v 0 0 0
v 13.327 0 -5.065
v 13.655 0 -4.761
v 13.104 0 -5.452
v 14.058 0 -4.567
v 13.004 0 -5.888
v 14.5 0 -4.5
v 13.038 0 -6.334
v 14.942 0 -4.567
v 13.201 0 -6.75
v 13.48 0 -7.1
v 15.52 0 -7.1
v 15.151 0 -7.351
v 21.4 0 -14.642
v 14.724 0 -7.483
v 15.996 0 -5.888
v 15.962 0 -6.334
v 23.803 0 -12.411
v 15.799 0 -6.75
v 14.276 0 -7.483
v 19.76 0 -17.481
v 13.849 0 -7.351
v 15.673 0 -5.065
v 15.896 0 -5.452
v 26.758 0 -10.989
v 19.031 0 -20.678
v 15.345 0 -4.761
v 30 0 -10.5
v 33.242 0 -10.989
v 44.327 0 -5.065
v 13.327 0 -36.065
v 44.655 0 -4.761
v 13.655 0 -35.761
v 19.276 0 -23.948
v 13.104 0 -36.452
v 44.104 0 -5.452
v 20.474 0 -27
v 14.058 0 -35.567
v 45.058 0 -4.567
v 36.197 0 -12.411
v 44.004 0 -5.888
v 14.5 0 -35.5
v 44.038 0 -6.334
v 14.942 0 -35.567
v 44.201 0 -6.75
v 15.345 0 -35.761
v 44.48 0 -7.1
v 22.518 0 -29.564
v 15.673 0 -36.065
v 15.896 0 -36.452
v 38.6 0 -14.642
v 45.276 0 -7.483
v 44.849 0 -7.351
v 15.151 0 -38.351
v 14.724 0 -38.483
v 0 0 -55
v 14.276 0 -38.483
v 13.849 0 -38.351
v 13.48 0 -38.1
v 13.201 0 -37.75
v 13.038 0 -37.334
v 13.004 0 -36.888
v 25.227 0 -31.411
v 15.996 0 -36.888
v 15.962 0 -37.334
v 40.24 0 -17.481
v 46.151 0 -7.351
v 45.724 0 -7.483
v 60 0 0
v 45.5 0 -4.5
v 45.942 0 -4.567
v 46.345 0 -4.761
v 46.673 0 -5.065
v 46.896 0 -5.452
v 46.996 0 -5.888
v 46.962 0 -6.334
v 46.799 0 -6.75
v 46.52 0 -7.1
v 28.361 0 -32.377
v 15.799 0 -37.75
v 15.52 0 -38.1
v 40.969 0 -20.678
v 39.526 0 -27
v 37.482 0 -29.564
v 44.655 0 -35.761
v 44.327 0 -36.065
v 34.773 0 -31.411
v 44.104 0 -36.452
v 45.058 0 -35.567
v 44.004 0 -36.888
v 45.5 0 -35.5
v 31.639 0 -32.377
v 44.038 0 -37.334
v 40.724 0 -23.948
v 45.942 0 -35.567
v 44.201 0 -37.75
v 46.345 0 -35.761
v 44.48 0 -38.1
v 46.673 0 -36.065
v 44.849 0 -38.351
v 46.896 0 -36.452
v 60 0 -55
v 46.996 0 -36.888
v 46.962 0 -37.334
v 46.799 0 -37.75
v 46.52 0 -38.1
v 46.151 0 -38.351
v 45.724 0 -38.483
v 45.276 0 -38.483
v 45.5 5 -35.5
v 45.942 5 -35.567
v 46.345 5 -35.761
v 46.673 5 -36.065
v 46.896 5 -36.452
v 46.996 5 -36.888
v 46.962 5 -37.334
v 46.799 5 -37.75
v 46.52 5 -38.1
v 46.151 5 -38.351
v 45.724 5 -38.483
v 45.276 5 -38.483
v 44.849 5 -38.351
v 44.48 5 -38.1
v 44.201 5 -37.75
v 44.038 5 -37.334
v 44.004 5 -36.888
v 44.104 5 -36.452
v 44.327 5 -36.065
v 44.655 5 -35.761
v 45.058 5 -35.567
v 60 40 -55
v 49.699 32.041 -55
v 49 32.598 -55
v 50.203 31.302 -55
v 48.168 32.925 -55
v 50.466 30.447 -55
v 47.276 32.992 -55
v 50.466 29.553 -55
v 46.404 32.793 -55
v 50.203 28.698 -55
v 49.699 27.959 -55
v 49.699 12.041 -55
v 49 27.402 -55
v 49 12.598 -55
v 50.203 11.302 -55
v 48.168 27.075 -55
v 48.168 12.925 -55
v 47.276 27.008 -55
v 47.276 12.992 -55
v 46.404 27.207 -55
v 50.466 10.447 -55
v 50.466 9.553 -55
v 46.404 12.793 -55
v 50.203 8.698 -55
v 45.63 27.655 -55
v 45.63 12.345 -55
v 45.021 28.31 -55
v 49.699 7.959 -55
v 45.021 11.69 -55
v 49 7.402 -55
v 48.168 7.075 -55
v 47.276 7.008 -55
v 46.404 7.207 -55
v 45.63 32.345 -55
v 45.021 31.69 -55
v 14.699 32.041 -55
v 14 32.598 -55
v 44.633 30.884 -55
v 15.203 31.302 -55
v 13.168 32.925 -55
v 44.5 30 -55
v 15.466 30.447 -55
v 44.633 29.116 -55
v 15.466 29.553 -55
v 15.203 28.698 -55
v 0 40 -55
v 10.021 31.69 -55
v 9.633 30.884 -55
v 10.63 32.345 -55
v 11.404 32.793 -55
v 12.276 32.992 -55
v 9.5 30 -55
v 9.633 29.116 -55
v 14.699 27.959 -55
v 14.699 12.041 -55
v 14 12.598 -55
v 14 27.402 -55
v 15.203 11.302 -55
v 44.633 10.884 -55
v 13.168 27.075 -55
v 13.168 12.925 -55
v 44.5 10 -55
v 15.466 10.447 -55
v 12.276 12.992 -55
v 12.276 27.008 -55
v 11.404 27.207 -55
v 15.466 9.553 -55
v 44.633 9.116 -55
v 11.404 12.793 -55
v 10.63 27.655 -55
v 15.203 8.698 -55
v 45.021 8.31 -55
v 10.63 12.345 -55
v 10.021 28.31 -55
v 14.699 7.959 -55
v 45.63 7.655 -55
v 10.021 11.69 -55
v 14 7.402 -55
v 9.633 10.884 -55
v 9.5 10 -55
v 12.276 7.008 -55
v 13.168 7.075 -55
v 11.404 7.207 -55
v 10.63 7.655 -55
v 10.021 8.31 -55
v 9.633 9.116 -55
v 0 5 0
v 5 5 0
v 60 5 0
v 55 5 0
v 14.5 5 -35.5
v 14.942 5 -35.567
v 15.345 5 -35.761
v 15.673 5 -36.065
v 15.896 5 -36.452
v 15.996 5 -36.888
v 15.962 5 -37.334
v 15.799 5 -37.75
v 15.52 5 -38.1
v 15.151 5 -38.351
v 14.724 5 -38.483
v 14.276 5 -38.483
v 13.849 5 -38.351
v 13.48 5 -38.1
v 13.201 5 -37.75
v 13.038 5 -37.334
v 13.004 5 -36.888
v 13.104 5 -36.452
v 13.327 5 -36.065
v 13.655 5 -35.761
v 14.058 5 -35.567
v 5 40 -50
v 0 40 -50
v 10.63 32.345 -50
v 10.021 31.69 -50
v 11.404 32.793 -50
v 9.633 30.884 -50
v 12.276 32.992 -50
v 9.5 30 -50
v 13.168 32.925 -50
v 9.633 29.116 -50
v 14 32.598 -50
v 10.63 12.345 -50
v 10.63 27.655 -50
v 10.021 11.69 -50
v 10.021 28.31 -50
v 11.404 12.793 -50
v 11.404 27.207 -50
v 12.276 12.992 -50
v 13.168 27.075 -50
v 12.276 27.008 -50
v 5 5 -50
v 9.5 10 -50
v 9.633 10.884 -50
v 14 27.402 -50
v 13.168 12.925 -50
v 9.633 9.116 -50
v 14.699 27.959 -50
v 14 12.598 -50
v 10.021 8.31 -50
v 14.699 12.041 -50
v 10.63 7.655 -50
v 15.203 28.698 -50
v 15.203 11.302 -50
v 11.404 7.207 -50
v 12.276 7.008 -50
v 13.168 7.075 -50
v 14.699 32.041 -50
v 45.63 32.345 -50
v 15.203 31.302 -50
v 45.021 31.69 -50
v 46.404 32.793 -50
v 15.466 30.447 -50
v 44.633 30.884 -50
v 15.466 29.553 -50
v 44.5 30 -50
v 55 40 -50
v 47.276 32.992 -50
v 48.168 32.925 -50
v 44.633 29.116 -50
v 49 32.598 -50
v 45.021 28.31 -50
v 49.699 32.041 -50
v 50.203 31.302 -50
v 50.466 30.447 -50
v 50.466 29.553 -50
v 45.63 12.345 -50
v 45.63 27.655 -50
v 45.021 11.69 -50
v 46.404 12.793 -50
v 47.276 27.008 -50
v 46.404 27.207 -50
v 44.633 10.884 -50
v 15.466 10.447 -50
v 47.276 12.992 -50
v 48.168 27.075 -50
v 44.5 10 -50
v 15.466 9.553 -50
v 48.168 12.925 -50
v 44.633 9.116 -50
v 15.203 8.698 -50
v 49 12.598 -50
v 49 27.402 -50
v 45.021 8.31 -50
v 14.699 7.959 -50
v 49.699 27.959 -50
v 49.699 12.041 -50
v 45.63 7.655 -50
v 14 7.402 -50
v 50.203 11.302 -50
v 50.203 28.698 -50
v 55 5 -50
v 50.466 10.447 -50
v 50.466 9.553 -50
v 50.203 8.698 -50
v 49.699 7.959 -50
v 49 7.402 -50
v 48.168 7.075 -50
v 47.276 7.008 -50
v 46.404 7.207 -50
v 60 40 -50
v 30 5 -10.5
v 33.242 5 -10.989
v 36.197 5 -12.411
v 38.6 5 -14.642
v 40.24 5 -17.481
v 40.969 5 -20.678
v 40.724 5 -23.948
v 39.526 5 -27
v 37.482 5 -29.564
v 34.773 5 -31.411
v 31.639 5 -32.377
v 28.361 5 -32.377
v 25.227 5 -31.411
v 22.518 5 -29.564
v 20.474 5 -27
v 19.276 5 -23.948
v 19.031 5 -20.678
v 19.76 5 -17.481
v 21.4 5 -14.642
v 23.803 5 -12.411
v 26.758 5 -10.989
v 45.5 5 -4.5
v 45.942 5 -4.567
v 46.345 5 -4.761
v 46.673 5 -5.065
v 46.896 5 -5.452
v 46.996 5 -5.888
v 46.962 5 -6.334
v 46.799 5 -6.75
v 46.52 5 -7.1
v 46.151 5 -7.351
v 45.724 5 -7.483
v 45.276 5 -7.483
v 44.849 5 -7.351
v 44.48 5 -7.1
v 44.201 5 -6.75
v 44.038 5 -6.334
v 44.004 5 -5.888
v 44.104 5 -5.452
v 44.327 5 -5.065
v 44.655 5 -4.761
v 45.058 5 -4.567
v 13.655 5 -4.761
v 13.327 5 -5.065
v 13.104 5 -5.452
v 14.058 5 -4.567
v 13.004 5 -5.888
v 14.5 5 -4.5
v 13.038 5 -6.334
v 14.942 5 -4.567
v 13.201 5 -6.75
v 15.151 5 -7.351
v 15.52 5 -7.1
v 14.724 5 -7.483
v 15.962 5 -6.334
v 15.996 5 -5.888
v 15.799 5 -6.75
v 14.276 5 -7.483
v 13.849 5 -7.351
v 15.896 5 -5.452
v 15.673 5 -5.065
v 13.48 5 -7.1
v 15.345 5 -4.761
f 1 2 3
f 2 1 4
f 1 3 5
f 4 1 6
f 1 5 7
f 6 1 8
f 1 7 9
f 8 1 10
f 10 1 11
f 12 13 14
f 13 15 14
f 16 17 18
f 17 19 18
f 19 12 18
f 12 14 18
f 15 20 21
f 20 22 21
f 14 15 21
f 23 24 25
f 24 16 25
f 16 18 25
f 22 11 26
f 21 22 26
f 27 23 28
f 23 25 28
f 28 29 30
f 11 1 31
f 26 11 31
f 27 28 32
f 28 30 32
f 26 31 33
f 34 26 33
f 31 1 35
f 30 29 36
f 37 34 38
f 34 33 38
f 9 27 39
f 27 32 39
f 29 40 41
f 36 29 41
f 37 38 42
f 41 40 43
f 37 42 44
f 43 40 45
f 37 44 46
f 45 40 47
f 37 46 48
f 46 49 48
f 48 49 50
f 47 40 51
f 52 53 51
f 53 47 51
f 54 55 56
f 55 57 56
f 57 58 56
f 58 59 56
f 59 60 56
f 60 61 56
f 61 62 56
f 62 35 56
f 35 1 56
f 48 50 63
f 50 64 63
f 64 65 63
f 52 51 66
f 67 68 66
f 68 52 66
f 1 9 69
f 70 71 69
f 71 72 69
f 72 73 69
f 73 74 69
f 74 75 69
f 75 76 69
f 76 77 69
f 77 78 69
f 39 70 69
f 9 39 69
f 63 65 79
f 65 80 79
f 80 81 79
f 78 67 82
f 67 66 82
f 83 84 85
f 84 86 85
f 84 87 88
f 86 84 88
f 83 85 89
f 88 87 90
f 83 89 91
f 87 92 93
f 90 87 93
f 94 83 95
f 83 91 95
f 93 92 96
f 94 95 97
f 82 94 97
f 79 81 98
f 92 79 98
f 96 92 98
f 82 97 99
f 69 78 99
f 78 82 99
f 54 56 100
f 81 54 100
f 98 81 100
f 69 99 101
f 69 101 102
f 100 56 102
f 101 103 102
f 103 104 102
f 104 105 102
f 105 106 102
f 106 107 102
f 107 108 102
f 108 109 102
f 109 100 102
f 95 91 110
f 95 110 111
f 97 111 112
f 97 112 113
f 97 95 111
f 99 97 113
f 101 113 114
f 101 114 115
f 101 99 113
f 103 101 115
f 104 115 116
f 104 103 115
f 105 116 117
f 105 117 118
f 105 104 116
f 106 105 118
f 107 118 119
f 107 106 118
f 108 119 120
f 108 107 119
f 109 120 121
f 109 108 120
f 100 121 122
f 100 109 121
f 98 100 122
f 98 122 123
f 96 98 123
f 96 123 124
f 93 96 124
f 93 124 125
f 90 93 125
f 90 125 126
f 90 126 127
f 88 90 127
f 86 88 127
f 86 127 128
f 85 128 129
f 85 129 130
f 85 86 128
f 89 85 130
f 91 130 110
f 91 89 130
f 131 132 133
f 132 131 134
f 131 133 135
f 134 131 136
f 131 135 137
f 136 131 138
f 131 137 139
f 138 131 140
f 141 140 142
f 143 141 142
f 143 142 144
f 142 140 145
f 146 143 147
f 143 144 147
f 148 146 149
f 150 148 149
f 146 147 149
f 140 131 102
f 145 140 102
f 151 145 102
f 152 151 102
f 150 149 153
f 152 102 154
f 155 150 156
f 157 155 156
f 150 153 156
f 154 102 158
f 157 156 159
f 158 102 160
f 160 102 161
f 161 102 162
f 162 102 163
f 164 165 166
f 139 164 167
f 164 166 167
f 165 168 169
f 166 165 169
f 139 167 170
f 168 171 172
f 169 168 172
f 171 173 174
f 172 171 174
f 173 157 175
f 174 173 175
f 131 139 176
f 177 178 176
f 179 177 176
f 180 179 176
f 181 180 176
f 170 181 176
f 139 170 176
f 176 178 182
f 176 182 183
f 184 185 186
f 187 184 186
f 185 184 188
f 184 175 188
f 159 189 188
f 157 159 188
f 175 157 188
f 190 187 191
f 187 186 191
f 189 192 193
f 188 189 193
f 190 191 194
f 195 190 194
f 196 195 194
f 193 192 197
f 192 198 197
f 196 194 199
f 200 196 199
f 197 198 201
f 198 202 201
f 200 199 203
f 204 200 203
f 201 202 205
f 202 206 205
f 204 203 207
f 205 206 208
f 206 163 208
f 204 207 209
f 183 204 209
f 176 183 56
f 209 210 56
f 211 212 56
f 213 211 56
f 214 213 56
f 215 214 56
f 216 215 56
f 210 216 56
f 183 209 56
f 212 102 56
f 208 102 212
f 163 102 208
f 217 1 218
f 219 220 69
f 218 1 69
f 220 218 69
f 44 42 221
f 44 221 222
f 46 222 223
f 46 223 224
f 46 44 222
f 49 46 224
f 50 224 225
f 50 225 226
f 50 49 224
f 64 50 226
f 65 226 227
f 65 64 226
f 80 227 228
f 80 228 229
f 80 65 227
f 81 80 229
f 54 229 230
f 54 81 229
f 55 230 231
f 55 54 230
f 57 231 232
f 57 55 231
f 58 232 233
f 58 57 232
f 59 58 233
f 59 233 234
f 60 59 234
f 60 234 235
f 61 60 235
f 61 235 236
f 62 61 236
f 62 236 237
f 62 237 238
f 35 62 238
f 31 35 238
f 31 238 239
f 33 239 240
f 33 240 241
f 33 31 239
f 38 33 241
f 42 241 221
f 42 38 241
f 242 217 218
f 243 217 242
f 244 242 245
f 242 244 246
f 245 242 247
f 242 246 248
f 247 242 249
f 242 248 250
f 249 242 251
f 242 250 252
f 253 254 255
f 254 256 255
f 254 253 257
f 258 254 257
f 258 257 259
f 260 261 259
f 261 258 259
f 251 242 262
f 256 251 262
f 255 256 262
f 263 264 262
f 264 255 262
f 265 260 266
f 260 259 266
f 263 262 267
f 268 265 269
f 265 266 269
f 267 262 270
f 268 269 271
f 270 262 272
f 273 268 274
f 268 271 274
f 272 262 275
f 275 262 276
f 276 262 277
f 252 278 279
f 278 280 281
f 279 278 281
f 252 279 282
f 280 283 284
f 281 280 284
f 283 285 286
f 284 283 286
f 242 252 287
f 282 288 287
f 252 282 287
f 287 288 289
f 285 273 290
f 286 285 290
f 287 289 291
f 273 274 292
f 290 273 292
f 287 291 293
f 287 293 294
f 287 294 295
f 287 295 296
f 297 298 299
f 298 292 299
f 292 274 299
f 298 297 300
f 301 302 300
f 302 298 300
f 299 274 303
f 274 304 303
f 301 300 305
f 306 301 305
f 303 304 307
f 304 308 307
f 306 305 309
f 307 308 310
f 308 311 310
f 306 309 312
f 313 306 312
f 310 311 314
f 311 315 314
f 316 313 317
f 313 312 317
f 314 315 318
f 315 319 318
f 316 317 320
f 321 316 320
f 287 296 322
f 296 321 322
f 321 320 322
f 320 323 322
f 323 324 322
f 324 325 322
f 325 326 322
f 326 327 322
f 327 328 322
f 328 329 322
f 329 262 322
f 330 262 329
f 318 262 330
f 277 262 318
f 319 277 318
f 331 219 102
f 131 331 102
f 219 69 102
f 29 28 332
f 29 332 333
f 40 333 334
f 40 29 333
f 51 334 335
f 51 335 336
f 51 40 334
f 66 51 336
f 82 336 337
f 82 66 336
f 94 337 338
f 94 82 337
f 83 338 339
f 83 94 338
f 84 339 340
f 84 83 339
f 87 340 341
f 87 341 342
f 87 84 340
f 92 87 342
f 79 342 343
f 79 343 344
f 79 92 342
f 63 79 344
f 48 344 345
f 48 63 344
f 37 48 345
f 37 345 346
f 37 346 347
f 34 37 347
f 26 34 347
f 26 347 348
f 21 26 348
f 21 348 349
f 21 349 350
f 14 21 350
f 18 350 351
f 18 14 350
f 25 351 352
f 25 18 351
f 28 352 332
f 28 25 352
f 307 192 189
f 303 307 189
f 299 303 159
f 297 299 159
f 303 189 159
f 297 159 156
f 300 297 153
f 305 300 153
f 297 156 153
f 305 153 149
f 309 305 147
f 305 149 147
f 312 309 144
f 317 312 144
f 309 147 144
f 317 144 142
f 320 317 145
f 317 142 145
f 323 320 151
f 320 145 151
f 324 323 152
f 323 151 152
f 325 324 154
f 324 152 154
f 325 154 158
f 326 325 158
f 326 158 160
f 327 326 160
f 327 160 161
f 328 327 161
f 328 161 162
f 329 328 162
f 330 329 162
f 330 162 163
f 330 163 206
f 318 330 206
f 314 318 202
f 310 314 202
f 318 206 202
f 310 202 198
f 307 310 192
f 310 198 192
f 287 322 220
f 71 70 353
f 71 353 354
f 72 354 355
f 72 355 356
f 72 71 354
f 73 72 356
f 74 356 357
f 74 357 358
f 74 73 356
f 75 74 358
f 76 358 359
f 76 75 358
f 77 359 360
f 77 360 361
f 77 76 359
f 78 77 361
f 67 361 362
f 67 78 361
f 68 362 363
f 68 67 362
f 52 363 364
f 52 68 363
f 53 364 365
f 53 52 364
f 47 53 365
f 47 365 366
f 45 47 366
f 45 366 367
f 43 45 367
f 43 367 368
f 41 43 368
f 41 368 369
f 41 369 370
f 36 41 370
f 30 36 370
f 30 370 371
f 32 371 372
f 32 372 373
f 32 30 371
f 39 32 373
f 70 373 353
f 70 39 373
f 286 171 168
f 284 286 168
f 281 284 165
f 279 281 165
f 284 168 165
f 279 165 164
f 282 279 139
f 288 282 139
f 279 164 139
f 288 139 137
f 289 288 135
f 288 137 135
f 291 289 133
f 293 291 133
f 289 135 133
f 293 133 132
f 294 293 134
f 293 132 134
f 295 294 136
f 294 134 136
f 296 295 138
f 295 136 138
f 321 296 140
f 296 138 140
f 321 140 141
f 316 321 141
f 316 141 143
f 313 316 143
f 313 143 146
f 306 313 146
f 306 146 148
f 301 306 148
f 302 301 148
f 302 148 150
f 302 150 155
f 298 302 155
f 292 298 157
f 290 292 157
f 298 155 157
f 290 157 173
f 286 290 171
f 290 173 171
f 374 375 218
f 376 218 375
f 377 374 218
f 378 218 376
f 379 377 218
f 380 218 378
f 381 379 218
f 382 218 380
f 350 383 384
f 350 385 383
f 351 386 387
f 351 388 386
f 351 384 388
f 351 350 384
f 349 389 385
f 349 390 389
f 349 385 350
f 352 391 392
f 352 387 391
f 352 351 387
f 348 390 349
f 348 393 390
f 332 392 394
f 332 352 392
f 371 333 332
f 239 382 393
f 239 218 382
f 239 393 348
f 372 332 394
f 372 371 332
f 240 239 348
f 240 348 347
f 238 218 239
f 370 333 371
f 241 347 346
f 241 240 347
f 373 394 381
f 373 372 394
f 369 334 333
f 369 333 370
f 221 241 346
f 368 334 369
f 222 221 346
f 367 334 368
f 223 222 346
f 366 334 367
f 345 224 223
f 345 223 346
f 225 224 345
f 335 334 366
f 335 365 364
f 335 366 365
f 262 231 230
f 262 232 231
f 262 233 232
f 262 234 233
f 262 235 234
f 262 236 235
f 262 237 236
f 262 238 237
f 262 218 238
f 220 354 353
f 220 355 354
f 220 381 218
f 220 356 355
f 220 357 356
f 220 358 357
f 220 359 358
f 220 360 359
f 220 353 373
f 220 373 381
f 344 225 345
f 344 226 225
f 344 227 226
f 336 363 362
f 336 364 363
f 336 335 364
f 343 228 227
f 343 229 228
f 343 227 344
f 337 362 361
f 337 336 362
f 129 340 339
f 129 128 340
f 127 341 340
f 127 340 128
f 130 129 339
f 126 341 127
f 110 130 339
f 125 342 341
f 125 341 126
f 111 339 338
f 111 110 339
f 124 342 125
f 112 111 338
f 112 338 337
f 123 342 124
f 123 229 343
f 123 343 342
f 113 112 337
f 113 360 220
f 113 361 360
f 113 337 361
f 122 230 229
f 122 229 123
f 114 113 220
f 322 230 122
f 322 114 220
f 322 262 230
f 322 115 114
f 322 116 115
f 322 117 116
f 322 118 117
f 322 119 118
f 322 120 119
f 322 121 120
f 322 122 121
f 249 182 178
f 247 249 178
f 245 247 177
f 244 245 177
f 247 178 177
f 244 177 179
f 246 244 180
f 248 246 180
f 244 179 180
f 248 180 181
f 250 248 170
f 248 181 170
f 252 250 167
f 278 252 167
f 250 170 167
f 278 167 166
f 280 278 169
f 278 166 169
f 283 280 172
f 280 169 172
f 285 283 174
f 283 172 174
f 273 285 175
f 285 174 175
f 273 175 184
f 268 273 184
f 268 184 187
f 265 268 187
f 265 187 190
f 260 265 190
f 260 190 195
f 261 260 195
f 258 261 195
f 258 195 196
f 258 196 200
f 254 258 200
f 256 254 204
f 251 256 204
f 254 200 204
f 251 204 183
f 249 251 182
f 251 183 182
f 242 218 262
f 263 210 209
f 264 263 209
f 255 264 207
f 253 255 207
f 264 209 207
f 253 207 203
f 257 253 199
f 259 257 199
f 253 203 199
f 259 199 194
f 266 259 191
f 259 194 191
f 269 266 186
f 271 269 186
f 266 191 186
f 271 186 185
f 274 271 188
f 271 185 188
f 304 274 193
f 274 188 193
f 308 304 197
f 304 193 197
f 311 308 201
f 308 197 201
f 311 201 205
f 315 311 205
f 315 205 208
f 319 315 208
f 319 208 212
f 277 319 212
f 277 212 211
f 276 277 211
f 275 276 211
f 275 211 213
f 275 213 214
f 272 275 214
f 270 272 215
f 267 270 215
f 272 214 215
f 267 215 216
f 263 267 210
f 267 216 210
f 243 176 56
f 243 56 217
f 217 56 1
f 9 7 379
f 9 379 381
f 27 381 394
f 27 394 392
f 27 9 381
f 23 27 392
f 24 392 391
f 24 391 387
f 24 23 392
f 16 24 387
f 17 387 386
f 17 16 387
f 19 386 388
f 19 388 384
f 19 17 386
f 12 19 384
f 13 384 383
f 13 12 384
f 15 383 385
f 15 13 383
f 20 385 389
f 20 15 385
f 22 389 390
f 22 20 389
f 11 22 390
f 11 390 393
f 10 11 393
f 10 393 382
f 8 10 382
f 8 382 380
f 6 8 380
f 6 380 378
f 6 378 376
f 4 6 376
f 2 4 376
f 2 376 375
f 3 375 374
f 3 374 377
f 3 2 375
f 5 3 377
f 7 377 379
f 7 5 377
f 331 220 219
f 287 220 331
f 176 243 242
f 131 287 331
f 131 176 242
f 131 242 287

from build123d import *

# Parameters (mm, degrees)
SKETCH_1_W          = 60
SKETCH_1_H          = 55
SKETCH_1_R          = 11
SKETCH_1_R_2        = 1.5
EXTRUDE_1_DEPTH     = 5
EXTRUDE_2_DEPTH     = 35
SKETCH_4_R          = 3
CUT_EXTRUDE_1_DEPTH = 5
CUT_EXTRUDE_2_REACH = 92.692


with BuildPart() as part:
    # Эскиз1 → Бобышка-Вытянуть1 (new body)
    with BuildSketch(Plane(origin=(0, 0, 0), x_dir=(1, 0, 0), z_dir=(0, 1, 0))):
        with Locations((30, 27.5)):
            Rectangle(SKETCH_1_W, SKETCH_1_H)
        with Locations(Location((30, 21.5, 0), (0, 0, 270))):
            Circle(SKETCH_1_R, mode=Mode.SUBTRACT)
        with Locations(Location((14.5, 37, 0), (0, 0, 270))):
            Circle(SKETCH_1_R_2, mode=Mode.SUBTRACT)
        with Locations(Location((45.5, 37, 0), (0, 0, 270))):
            Circle(SKETCH_1_R_2, mode=Mode.SUBTRACT)
        with Locations(Location((45.5, 6, 0), (0, 0, 270))):
            Circle(SKETCH_1_R_2, mode=Mode.SUBTRACT)
        with Locations(Location((14.5, 6, 0), (0, 0, 270))):
            Circle(SKETCH_1_R_2, mode=Mode.SUBTRACT)
    extrude(amount=EXTRUDE_1_DEPTH)

    # Эскиз3 → Бобышка-Вытянуть2 (add)
    with BuildSketch(Plane(origin=(0, 5, 0), x_dir=(1, 0, 0), z_dir=(0, 1, 0))):
        Polygon((5, 50), (55, 50), (55, 0), (60, 0), (60, 55), (0, 55), (0, 0), (5, 0), align=None)
    extrude(amount=EXTRUDE_2_DEPTH)

    # Эскиз4 → Вырез-Вытянуть1 (cut)
    with BuildSketch(Plane(origin=(0, 0, -55), x_dir=(-1, 0, 0), z_dir=(0, 0, -1))):
        with Locations((-12.5, 10)):
            Circle(SKETCH_4_R)
        with Locations((-12.5, 30)):
            Circle(SKETCH_4_R)
        with Locations((-47.5, 30)):
            Circle(SKETCH_4_R)
        with Locations((-47.5, 10)):
            Circle(SKETCH_4_R)
    extrude(amount=-CUT_EXTRUDE_1_DEPTH, mode=Mode.SUBTRACT)

    # Вырез-Вытянуть2: up to this face of the body (flat: up to its plane)
    cut_extrude_2_end = Plane(part.part.faces().sort_by_distance((60, 20, -27.5))[0])
    # Эскиз5 → Вырез-Вытянуть2 (cut, up to the picked face)
    with BuildSketch(Plane.ZY, mode=Mode.PRIVATE) as cut_extrude_2_sk1:
        Polygon((0, 5), (-50, 40), (0, 40), align=None)
    cut_extrude_2_tool1 = split(extrude(cut_extrude_2_sk1.sketch, amount=-CUT_EXTRUDE_2_REACH, mode=Mode.PRIVATE), bisect_by=cut_extrude_2_end, keep=Keep.BOTH, mode=Mode.PRIVATE)
    add(cut_extrude_2_tool1.solids().sort_by(Axis((0, 28.333333, -16.666667), (1, 0, 0)))[0], mode=Mode.SUBTRACT)


solid = part.part
